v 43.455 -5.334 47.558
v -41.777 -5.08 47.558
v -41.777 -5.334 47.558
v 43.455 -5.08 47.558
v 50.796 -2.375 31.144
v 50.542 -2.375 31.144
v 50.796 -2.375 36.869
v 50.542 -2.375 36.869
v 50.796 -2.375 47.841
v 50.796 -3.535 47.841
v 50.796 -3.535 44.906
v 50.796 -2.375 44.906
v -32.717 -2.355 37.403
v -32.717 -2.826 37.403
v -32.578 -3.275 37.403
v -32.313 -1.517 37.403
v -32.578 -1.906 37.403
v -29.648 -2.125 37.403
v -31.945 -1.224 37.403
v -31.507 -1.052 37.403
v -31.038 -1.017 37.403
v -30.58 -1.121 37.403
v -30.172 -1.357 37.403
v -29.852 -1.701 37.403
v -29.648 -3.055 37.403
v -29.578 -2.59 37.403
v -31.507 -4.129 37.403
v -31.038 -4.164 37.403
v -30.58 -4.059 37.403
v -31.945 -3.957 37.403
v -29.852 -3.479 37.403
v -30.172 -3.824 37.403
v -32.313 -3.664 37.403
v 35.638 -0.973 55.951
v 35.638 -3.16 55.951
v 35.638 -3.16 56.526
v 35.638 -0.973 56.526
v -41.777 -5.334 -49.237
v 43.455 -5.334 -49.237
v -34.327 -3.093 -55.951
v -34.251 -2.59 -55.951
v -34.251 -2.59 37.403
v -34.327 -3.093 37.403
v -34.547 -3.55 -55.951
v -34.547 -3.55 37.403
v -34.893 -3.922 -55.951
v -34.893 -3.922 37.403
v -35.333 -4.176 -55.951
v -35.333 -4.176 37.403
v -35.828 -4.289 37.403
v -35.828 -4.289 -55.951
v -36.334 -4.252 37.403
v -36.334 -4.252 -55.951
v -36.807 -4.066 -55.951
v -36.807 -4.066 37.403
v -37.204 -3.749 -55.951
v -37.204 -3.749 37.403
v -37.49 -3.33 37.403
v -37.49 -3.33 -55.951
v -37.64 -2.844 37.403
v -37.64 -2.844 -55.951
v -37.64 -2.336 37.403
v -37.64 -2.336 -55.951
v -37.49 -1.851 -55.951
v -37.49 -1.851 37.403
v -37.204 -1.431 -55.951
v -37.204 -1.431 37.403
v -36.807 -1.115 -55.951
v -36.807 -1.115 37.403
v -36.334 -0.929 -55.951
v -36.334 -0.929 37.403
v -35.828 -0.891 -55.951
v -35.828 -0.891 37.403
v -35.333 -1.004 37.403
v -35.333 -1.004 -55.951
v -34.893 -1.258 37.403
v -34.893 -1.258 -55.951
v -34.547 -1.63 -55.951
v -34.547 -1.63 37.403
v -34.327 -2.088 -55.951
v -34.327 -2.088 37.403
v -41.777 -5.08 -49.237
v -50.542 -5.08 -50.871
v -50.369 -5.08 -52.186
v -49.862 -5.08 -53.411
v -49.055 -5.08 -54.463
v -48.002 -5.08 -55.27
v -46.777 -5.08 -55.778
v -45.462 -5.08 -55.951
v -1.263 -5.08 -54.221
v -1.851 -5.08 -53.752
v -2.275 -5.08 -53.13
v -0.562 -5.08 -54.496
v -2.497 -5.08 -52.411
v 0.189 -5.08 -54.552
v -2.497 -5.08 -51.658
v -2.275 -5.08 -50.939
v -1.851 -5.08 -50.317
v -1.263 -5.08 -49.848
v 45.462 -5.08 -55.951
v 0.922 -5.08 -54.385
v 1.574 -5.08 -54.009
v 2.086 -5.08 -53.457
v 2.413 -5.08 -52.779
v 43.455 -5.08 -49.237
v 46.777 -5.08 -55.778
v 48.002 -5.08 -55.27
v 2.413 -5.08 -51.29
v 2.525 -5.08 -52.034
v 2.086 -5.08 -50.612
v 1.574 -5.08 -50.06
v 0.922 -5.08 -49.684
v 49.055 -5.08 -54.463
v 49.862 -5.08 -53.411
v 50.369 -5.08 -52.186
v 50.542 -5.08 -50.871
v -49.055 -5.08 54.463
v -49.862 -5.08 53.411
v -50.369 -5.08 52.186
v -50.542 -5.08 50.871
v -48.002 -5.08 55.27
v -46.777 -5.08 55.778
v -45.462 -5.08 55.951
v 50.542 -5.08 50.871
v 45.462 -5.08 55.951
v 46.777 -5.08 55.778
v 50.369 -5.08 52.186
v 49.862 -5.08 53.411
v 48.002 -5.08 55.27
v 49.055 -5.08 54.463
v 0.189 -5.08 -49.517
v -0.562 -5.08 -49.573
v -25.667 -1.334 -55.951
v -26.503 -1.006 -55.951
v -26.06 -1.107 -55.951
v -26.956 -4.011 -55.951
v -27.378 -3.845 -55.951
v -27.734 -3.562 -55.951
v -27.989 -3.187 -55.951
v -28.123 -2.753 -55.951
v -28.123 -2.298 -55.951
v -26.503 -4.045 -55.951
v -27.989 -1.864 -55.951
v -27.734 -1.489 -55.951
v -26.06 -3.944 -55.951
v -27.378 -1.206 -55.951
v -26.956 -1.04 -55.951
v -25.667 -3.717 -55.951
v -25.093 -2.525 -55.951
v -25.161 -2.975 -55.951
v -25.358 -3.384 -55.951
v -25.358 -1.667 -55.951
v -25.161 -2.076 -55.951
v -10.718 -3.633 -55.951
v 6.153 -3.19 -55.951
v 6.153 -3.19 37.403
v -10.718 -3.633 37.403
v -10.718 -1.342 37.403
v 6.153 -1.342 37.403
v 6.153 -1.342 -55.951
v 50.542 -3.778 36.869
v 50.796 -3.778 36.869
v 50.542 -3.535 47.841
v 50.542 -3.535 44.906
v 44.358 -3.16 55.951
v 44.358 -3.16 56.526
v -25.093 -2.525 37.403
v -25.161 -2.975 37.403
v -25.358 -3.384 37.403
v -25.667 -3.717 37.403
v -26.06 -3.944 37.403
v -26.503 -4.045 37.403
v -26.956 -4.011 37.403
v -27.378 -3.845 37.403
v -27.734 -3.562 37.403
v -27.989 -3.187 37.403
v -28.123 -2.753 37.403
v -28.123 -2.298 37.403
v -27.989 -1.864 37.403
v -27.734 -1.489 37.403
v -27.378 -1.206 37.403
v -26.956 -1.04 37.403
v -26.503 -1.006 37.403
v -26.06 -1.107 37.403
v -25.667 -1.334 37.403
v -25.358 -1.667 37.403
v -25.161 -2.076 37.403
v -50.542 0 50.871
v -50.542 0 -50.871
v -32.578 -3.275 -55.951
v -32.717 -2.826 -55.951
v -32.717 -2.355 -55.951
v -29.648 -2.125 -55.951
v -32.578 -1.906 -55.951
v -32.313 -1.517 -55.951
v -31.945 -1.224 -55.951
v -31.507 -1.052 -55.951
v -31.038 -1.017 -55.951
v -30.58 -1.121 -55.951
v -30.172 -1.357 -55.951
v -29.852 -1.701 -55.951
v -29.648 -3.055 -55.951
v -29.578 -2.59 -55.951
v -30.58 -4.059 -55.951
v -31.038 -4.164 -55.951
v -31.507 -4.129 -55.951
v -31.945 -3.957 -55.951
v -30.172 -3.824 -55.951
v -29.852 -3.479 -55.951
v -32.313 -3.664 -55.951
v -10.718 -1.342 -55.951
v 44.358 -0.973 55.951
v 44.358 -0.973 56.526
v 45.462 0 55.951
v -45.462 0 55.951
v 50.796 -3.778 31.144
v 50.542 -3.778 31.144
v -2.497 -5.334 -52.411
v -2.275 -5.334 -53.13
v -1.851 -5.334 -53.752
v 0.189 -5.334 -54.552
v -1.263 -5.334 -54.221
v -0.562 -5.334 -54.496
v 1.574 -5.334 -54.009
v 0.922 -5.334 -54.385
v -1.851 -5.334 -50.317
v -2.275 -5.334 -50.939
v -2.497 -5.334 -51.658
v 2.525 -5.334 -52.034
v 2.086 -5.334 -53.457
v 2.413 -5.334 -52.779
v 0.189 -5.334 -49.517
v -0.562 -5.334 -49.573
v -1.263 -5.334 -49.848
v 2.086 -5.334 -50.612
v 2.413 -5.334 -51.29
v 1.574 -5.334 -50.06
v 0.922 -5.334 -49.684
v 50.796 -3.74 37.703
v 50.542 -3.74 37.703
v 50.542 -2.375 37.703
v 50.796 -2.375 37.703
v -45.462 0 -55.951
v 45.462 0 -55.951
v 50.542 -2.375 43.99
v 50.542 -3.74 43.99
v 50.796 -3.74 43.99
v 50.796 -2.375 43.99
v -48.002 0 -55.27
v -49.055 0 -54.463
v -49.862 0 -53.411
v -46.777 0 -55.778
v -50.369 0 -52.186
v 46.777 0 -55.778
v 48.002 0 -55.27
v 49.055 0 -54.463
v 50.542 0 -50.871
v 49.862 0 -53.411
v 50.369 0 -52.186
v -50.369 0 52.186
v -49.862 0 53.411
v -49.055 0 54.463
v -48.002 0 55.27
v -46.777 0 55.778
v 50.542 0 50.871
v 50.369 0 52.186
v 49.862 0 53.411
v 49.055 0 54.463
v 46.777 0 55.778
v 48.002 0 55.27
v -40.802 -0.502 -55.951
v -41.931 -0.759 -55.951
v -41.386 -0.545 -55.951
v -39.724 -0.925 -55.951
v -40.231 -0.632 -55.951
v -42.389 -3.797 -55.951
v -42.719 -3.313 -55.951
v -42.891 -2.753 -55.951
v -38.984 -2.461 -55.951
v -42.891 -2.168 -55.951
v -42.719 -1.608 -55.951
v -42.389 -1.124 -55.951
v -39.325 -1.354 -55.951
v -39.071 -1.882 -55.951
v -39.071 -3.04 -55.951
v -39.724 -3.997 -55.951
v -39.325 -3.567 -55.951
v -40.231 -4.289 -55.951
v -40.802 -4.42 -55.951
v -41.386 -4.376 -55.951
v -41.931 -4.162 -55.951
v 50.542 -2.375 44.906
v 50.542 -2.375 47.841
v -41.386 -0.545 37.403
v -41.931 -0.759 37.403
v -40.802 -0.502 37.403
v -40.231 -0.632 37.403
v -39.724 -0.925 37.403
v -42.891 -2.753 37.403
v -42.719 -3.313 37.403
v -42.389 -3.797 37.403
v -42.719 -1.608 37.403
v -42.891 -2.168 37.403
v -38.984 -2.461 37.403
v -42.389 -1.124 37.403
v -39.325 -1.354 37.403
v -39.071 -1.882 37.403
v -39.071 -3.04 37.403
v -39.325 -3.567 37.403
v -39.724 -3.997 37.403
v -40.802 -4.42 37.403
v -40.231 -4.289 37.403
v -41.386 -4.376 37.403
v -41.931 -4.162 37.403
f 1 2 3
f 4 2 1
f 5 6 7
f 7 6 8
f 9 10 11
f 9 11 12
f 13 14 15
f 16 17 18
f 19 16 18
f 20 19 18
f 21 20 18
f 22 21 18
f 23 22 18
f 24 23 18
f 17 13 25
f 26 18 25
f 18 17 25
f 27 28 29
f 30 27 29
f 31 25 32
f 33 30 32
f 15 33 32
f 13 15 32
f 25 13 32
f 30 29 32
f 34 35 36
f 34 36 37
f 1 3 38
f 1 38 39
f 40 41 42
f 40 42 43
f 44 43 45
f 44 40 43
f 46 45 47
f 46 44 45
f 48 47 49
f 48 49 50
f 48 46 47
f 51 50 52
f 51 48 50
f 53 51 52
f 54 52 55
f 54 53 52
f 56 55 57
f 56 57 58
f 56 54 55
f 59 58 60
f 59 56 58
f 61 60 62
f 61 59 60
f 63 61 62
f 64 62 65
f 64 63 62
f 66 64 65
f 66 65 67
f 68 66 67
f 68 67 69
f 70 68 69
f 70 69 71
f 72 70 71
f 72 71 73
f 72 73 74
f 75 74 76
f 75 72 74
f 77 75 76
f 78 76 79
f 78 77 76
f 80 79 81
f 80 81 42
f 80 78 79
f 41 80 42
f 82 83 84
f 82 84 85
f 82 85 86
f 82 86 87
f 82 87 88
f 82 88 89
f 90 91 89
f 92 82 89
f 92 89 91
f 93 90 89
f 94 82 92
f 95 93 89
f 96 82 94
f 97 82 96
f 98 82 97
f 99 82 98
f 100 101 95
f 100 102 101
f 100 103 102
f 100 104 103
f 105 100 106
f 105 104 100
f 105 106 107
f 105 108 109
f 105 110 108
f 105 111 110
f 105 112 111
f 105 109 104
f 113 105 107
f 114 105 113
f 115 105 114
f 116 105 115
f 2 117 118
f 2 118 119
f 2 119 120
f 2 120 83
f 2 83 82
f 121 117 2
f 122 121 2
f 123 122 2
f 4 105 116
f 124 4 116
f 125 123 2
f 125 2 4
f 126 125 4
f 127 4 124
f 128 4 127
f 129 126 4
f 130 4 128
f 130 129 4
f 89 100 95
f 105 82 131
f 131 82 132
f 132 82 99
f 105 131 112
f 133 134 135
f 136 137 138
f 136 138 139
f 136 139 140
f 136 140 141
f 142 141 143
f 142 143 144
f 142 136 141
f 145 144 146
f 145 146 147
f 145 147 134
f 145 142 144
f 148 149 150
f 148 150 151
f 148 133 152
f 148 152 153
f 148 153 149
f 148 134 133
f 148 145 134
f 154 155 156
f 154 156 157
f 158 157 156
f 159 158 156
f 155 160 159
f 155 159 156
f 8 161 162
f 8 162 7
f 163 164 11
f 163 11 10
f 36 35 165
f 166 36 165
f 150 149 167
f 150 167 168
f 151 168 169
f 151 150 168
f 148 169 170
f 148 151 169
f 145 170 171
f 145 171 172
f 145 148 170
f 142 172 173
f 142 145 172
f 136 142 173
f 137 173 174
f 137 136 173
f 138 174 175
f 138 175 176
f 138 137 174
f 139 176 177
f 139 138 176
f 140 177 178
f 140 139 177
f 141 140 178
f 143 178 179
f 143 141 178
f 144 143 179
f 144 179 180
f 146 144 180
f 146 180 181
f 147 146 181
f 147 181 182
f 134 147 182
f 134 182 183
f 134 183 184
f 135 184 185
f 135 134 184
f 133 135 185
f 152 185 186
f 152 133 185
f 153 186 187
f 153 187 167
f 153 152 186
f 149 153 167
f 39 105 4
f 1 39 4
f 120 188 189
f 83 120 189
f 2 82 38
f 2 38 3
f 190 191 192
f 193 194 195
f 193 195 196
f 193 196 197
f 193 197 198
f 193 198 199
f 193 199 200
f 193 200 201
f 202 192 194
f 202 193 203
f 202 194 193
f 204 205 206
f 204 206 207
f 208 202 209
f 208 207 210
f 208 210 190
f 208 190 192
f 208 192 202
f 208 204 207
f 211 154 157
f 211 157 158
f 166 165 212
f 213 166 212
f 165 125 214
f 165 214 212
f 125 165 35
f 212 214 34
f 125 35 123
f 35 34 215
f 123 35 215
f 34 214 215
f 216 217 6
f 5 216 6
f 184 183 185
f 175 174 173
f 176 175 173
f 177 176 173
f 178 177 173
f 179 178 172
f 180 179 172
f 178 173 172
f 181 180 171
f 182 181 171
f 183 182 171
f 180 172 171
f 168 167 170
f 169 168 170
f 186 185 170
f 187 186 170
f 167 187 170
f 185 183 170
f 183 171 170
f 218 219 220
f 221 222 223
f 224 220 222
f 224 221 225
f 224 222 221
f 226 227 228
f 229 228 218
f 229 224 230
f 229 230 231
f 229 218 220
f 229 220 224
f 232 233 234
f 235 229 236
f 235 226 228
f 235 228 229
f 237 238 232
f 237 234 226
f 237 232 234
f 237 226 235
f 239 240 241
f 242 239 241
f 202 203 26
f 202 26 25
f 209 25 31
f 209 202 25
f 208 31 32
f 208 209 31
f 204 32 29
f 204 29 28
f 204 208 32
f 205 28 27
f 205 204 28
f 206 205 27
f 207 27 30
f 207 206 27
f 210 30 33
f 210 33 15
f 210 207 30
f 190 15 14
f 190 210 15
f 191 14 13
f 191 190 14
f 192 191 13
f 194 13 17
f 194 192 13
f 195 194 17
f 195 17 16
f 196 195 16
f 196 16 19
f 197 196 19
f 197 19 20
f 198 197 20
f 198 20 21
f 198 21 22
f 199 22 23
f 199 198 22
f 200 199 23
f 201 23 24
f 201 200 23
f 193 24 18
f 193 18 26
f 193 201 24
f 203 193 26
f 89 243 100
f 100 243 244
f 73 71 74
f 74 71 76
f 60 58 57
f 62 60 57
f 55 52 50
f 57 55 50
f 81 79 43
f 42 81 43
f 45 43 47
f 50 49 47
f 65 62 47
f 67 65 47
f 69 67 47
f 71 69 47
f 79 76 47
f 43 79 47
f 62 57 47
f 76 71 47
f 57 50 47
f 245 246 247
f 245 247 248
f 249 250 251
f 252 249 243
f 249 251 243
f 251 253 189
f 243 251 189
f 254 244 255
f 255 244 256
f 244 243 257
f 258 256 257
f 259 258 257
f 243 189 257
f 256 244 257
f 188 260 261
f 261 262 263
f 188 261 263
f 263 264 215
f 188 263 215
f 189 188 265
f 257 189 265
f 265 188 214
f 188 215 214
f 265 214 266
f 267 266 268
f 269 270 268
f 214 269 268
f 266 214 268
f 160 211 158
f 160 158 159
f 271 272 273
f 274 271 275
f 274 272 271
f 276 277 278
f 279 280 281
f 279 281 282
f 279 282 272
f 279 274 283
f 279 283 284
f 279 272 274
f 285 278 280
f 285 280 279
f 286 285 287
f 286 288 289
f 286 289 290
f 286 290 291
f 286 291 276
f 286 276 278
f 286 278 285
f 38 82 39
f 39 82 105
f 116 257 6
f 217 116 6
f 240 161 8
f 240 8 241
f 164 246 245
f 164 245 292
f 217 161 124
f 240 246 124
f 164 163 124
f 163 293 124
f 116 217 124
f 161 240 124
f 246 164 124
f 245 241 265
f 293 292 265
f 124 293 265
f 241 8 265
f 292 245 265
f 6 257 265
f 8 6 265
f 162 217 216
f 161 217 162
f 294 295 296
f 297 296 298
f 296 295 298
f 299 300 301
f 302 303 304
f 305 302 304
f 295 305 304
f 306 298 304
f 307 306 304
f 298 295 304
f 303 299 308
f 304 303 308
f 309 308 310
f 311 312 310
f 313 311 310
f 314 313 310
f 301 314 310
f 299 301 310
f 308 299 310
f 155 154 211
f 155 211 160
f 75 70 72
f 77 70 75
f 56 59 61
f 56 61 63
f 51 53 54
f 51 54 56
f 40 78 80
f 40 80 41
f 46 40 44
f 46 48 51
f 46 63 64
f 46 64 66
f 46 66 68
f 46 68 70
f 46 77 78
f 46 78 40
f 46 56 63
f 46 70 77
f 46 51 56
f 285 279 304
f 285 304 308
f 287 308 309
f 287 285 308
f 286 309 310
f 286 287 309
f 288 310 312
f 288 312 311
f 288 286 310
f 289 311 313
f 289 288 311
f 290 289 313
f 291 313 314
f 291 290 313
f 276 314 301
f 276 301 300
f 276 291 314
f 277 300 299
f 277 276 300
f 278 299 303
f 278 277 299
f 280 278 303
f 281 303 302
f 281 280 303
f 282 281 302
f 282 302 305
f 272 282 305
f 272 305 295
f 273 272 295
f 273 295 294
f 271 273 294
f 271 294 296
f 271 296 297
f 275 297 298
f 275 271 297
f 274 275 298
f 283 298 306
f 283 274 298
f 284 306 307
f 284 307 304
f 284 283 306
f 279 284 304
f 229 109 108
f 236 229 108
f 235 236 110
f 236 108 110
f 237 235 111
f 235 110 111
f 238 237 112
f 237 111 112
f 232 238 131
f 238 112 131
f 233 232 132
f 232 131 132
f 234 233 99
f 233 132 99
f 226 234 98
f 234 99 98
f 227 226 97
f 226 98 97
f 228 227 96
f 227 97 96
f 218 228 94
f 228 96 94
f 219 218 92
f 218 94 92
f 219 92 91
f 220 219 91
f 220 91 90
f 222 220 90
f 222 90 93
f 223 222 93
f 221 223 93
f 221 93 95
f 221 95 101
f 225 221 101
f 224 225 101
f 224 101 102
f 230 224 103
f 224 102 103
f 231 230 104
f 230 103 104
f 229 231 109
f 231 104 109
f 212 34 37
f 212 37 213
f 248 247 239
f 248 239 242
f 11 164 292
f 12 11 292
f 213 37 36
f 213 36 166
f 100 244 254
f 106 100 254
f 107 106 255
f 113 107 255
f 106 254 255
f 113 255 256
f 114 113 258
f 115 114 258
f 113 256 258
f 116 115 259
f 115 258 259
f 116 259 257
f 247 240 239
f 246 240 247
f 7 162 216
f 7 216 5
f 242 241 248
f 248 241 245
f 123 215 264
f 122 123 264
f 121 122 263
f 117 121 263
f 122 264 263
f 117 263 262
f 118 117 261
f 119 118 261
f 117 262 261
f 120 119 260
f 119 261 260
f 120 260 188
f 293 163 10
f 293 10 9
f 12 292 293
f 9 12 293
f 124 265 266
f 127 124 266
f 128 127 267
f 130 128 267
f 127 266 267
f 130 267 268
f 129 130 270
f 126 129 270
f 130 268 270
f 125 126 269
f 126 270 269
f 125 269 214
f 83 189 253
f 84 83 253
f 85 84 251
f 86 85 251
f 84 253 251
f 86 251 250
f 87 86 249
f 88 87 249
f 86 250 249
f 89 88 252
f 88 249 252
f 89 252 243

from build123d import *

# Parameters (mm, degrees)
F0_R      = 2.737762288
F0_R_2    = 1.0985637782
F1_DEPTH  = 5.08
F2_W      = 85.2321013808
F2_H      = 96.7953205109
F3_DEPTH  = 0.254
F6_DEPTH  = 93.3540835977
F5_R      = 1.9645563542
F5_R_2    = 1.7038978903
F5_R_3    = 1.5780003366
F5_R_4    = 1.5237356412
F7_W      = 8.7204426527
F7_H      = 2.1868101903
F8_DEPTH  = 0.5746809766
F9_R      = 2.5250145547
F10_DEPTH = 0.254
F11_W     = 1.3652069028
F11_H     = 6.2867105007
F11_W_2   = 1.403221162
F11_H_2   = 5.7247150689
F11_W_3   = 1.1607955676
F11_H_3   = 2.9349811375
F12_DEPTH = 0.254


# Not quite as in the source:
# - a feature names something its author has since deleted; it is built from what else it names


with BuildPart() as f1:
    # F0 (on Front) → F1 (new body)
    with BuildSketch(Plane.XZ):
        with BuildLine():
            Line((45.462447716, 55.951051414), (-45.462447716, 55.951051414))
            ThreePointArc((-45.462447716, 55.951051414), (-49.0545501644, 54.4631538624), (-50.542447716, 50.871051414))
            Line((-50.542447716, 50.871051414), (-50.542447716, -50.871051414))
            ThreePointArc((-50.542447716, -50.871051414), (-49.0545501644, -54.4631538624), (-45.462447716, -55.951051414))
            Line((-45.462447716, -55.951051414), (45.462447716, -55.951051414))
            ThreePointArc((45.462447716, -55.951051414), (49.0545501644, -54.4631538624), (50.542447716, -50.871051414))
            Line((50.542447716, -50.871051414), (50.542447716, 50.871051414))
            ThreePointArc((50.542447716, 50.871051414), (49.0545501644, 54.4631538624), (45.462447716, 55.951051414))
        make_face()
        with Locations((0, -50.8815050125)):
            Circle(F0_R, mode=Mode.SUBTRACT)
        with Locations((0, 50.8815050125)):
            Circle(F0_R_2, mode=Mode.SUBTRACT)
        with Locations((0, -50.8815050125)):
            Circle(F0_R)
        with Locations((0, 50.8815050125)):
            Circle(F0_R_2)
    extrude(amount=F1_DEPTH)

    # F2 (on face) → F3 (join)
    with BuildSketch(Plane.XZ.offset(5.08)):
        with Locations((0.8392669261, -0.8392669261)):
            Rectangle(F2_W, F2_H)
    extrude(amount=F3_DEPTH)

    # F7 (on face) → F8 (join)
    with BuildSketch(Plane.XY.offset(55.951051414)):
        with Locations((39.9978160858, -2.066604764)):
            Rectangle(F7_W, F7_H)
    extrude(amount=F8_DEPTH)

    # F9 (on face) → F10 (join)
    with BuildSketch(Plane.XZ.offset(5.08)):
        with Locations((0, -52.0344786346)):
            Circle(F9_R)
    extrude(amount=F10_DEPTH)

    # F11 (on face) → F12 (join)
    with BuildSketch(Plane.YZ.offset(50.542447716)):
        with Locations((-3.0571169918, 40.8467166126)):
            Rectangle(F11_W, F11_H)
        with Locations((-3.0761241214, 34.0065797791)):
            Rectangle(F11_W_2, F11_H_2)
        with Locations((-2.9549113242, 46.373186633)):
            Rectangle(F11_W_3, F11_H_3)
    extrude(amount=F12_DEPTH)


with BuildPart() as f6:
    # F4 (on face) → F6 (new body)
    with BuildSketch(Plane(origin=(0, 0, -55.951051414), x_dir=(1, 0, 0), z_dir=(0, 0, -1))):
        Polygon((6.1532426625, 3.1897546723), (-10.7177691534, 3.632507287), (-10.7177691534, 1.3415296562), (6.1532426625, 1.3415296562), align=None)
    extrude(amount=-F6_DEPTH)


with BuildPart() as f6b:
    # F5 (on face) → F6, piece 2 (new body)
    with BuildSketch(Plane(origin=(0, 0, -55.951051414), x_dir=(1, 0, 0), z_dir=(0, 0, -1))):
        with Locations((-40.9486070275, 2.4606343359)):
            Circle(F5_R)
    extrude(amount=-F6_DEPTH)


with BuildPart() as f6c:
    # F5 (on face) → F6, piece 3 (new body)
    with BuildSketch(Plane(origin=(0, 0, -55.951051414), x_dir=(1, 0, 0), z_dir=(0, 0, -1))):
        with Locations((-35.9550975263, 2.5903359056)):
            Circle(F5_R_2)
    extrude(amount=-F6_DEPTH)


with BuildPart() as f6d:
    # F5 (on face) → F6, piece 4 (new body)
    with BuildSketch(Plane(origin=(0, 0, -55.951051414), x_dir=(1, 0, 0), z_dir=(0, 0, -1))):
        with Locations((-31.1561413109, 2.5903359056)):
            Circle(F5_R_3)
    extrude(amount=-F6_DEPTH)


with BuildPart() as f6e:
    # F5 (on face) → F6, piece 5 (new body)
    with BuildSketch(Plane(origin=(0, 0, -55.951051414), x_dir=(1, 0, 0), z_dir=(0, 0, -1))):
        with Locations((-26.6165900975, 2.525486052)):
            Circle(F5_R_4)
    extrude(amount=-F6_DEPTH)


solid = Compound([f1.part, f6.part, f6b.part, f6c.part, f6d.part, f6e.part])
